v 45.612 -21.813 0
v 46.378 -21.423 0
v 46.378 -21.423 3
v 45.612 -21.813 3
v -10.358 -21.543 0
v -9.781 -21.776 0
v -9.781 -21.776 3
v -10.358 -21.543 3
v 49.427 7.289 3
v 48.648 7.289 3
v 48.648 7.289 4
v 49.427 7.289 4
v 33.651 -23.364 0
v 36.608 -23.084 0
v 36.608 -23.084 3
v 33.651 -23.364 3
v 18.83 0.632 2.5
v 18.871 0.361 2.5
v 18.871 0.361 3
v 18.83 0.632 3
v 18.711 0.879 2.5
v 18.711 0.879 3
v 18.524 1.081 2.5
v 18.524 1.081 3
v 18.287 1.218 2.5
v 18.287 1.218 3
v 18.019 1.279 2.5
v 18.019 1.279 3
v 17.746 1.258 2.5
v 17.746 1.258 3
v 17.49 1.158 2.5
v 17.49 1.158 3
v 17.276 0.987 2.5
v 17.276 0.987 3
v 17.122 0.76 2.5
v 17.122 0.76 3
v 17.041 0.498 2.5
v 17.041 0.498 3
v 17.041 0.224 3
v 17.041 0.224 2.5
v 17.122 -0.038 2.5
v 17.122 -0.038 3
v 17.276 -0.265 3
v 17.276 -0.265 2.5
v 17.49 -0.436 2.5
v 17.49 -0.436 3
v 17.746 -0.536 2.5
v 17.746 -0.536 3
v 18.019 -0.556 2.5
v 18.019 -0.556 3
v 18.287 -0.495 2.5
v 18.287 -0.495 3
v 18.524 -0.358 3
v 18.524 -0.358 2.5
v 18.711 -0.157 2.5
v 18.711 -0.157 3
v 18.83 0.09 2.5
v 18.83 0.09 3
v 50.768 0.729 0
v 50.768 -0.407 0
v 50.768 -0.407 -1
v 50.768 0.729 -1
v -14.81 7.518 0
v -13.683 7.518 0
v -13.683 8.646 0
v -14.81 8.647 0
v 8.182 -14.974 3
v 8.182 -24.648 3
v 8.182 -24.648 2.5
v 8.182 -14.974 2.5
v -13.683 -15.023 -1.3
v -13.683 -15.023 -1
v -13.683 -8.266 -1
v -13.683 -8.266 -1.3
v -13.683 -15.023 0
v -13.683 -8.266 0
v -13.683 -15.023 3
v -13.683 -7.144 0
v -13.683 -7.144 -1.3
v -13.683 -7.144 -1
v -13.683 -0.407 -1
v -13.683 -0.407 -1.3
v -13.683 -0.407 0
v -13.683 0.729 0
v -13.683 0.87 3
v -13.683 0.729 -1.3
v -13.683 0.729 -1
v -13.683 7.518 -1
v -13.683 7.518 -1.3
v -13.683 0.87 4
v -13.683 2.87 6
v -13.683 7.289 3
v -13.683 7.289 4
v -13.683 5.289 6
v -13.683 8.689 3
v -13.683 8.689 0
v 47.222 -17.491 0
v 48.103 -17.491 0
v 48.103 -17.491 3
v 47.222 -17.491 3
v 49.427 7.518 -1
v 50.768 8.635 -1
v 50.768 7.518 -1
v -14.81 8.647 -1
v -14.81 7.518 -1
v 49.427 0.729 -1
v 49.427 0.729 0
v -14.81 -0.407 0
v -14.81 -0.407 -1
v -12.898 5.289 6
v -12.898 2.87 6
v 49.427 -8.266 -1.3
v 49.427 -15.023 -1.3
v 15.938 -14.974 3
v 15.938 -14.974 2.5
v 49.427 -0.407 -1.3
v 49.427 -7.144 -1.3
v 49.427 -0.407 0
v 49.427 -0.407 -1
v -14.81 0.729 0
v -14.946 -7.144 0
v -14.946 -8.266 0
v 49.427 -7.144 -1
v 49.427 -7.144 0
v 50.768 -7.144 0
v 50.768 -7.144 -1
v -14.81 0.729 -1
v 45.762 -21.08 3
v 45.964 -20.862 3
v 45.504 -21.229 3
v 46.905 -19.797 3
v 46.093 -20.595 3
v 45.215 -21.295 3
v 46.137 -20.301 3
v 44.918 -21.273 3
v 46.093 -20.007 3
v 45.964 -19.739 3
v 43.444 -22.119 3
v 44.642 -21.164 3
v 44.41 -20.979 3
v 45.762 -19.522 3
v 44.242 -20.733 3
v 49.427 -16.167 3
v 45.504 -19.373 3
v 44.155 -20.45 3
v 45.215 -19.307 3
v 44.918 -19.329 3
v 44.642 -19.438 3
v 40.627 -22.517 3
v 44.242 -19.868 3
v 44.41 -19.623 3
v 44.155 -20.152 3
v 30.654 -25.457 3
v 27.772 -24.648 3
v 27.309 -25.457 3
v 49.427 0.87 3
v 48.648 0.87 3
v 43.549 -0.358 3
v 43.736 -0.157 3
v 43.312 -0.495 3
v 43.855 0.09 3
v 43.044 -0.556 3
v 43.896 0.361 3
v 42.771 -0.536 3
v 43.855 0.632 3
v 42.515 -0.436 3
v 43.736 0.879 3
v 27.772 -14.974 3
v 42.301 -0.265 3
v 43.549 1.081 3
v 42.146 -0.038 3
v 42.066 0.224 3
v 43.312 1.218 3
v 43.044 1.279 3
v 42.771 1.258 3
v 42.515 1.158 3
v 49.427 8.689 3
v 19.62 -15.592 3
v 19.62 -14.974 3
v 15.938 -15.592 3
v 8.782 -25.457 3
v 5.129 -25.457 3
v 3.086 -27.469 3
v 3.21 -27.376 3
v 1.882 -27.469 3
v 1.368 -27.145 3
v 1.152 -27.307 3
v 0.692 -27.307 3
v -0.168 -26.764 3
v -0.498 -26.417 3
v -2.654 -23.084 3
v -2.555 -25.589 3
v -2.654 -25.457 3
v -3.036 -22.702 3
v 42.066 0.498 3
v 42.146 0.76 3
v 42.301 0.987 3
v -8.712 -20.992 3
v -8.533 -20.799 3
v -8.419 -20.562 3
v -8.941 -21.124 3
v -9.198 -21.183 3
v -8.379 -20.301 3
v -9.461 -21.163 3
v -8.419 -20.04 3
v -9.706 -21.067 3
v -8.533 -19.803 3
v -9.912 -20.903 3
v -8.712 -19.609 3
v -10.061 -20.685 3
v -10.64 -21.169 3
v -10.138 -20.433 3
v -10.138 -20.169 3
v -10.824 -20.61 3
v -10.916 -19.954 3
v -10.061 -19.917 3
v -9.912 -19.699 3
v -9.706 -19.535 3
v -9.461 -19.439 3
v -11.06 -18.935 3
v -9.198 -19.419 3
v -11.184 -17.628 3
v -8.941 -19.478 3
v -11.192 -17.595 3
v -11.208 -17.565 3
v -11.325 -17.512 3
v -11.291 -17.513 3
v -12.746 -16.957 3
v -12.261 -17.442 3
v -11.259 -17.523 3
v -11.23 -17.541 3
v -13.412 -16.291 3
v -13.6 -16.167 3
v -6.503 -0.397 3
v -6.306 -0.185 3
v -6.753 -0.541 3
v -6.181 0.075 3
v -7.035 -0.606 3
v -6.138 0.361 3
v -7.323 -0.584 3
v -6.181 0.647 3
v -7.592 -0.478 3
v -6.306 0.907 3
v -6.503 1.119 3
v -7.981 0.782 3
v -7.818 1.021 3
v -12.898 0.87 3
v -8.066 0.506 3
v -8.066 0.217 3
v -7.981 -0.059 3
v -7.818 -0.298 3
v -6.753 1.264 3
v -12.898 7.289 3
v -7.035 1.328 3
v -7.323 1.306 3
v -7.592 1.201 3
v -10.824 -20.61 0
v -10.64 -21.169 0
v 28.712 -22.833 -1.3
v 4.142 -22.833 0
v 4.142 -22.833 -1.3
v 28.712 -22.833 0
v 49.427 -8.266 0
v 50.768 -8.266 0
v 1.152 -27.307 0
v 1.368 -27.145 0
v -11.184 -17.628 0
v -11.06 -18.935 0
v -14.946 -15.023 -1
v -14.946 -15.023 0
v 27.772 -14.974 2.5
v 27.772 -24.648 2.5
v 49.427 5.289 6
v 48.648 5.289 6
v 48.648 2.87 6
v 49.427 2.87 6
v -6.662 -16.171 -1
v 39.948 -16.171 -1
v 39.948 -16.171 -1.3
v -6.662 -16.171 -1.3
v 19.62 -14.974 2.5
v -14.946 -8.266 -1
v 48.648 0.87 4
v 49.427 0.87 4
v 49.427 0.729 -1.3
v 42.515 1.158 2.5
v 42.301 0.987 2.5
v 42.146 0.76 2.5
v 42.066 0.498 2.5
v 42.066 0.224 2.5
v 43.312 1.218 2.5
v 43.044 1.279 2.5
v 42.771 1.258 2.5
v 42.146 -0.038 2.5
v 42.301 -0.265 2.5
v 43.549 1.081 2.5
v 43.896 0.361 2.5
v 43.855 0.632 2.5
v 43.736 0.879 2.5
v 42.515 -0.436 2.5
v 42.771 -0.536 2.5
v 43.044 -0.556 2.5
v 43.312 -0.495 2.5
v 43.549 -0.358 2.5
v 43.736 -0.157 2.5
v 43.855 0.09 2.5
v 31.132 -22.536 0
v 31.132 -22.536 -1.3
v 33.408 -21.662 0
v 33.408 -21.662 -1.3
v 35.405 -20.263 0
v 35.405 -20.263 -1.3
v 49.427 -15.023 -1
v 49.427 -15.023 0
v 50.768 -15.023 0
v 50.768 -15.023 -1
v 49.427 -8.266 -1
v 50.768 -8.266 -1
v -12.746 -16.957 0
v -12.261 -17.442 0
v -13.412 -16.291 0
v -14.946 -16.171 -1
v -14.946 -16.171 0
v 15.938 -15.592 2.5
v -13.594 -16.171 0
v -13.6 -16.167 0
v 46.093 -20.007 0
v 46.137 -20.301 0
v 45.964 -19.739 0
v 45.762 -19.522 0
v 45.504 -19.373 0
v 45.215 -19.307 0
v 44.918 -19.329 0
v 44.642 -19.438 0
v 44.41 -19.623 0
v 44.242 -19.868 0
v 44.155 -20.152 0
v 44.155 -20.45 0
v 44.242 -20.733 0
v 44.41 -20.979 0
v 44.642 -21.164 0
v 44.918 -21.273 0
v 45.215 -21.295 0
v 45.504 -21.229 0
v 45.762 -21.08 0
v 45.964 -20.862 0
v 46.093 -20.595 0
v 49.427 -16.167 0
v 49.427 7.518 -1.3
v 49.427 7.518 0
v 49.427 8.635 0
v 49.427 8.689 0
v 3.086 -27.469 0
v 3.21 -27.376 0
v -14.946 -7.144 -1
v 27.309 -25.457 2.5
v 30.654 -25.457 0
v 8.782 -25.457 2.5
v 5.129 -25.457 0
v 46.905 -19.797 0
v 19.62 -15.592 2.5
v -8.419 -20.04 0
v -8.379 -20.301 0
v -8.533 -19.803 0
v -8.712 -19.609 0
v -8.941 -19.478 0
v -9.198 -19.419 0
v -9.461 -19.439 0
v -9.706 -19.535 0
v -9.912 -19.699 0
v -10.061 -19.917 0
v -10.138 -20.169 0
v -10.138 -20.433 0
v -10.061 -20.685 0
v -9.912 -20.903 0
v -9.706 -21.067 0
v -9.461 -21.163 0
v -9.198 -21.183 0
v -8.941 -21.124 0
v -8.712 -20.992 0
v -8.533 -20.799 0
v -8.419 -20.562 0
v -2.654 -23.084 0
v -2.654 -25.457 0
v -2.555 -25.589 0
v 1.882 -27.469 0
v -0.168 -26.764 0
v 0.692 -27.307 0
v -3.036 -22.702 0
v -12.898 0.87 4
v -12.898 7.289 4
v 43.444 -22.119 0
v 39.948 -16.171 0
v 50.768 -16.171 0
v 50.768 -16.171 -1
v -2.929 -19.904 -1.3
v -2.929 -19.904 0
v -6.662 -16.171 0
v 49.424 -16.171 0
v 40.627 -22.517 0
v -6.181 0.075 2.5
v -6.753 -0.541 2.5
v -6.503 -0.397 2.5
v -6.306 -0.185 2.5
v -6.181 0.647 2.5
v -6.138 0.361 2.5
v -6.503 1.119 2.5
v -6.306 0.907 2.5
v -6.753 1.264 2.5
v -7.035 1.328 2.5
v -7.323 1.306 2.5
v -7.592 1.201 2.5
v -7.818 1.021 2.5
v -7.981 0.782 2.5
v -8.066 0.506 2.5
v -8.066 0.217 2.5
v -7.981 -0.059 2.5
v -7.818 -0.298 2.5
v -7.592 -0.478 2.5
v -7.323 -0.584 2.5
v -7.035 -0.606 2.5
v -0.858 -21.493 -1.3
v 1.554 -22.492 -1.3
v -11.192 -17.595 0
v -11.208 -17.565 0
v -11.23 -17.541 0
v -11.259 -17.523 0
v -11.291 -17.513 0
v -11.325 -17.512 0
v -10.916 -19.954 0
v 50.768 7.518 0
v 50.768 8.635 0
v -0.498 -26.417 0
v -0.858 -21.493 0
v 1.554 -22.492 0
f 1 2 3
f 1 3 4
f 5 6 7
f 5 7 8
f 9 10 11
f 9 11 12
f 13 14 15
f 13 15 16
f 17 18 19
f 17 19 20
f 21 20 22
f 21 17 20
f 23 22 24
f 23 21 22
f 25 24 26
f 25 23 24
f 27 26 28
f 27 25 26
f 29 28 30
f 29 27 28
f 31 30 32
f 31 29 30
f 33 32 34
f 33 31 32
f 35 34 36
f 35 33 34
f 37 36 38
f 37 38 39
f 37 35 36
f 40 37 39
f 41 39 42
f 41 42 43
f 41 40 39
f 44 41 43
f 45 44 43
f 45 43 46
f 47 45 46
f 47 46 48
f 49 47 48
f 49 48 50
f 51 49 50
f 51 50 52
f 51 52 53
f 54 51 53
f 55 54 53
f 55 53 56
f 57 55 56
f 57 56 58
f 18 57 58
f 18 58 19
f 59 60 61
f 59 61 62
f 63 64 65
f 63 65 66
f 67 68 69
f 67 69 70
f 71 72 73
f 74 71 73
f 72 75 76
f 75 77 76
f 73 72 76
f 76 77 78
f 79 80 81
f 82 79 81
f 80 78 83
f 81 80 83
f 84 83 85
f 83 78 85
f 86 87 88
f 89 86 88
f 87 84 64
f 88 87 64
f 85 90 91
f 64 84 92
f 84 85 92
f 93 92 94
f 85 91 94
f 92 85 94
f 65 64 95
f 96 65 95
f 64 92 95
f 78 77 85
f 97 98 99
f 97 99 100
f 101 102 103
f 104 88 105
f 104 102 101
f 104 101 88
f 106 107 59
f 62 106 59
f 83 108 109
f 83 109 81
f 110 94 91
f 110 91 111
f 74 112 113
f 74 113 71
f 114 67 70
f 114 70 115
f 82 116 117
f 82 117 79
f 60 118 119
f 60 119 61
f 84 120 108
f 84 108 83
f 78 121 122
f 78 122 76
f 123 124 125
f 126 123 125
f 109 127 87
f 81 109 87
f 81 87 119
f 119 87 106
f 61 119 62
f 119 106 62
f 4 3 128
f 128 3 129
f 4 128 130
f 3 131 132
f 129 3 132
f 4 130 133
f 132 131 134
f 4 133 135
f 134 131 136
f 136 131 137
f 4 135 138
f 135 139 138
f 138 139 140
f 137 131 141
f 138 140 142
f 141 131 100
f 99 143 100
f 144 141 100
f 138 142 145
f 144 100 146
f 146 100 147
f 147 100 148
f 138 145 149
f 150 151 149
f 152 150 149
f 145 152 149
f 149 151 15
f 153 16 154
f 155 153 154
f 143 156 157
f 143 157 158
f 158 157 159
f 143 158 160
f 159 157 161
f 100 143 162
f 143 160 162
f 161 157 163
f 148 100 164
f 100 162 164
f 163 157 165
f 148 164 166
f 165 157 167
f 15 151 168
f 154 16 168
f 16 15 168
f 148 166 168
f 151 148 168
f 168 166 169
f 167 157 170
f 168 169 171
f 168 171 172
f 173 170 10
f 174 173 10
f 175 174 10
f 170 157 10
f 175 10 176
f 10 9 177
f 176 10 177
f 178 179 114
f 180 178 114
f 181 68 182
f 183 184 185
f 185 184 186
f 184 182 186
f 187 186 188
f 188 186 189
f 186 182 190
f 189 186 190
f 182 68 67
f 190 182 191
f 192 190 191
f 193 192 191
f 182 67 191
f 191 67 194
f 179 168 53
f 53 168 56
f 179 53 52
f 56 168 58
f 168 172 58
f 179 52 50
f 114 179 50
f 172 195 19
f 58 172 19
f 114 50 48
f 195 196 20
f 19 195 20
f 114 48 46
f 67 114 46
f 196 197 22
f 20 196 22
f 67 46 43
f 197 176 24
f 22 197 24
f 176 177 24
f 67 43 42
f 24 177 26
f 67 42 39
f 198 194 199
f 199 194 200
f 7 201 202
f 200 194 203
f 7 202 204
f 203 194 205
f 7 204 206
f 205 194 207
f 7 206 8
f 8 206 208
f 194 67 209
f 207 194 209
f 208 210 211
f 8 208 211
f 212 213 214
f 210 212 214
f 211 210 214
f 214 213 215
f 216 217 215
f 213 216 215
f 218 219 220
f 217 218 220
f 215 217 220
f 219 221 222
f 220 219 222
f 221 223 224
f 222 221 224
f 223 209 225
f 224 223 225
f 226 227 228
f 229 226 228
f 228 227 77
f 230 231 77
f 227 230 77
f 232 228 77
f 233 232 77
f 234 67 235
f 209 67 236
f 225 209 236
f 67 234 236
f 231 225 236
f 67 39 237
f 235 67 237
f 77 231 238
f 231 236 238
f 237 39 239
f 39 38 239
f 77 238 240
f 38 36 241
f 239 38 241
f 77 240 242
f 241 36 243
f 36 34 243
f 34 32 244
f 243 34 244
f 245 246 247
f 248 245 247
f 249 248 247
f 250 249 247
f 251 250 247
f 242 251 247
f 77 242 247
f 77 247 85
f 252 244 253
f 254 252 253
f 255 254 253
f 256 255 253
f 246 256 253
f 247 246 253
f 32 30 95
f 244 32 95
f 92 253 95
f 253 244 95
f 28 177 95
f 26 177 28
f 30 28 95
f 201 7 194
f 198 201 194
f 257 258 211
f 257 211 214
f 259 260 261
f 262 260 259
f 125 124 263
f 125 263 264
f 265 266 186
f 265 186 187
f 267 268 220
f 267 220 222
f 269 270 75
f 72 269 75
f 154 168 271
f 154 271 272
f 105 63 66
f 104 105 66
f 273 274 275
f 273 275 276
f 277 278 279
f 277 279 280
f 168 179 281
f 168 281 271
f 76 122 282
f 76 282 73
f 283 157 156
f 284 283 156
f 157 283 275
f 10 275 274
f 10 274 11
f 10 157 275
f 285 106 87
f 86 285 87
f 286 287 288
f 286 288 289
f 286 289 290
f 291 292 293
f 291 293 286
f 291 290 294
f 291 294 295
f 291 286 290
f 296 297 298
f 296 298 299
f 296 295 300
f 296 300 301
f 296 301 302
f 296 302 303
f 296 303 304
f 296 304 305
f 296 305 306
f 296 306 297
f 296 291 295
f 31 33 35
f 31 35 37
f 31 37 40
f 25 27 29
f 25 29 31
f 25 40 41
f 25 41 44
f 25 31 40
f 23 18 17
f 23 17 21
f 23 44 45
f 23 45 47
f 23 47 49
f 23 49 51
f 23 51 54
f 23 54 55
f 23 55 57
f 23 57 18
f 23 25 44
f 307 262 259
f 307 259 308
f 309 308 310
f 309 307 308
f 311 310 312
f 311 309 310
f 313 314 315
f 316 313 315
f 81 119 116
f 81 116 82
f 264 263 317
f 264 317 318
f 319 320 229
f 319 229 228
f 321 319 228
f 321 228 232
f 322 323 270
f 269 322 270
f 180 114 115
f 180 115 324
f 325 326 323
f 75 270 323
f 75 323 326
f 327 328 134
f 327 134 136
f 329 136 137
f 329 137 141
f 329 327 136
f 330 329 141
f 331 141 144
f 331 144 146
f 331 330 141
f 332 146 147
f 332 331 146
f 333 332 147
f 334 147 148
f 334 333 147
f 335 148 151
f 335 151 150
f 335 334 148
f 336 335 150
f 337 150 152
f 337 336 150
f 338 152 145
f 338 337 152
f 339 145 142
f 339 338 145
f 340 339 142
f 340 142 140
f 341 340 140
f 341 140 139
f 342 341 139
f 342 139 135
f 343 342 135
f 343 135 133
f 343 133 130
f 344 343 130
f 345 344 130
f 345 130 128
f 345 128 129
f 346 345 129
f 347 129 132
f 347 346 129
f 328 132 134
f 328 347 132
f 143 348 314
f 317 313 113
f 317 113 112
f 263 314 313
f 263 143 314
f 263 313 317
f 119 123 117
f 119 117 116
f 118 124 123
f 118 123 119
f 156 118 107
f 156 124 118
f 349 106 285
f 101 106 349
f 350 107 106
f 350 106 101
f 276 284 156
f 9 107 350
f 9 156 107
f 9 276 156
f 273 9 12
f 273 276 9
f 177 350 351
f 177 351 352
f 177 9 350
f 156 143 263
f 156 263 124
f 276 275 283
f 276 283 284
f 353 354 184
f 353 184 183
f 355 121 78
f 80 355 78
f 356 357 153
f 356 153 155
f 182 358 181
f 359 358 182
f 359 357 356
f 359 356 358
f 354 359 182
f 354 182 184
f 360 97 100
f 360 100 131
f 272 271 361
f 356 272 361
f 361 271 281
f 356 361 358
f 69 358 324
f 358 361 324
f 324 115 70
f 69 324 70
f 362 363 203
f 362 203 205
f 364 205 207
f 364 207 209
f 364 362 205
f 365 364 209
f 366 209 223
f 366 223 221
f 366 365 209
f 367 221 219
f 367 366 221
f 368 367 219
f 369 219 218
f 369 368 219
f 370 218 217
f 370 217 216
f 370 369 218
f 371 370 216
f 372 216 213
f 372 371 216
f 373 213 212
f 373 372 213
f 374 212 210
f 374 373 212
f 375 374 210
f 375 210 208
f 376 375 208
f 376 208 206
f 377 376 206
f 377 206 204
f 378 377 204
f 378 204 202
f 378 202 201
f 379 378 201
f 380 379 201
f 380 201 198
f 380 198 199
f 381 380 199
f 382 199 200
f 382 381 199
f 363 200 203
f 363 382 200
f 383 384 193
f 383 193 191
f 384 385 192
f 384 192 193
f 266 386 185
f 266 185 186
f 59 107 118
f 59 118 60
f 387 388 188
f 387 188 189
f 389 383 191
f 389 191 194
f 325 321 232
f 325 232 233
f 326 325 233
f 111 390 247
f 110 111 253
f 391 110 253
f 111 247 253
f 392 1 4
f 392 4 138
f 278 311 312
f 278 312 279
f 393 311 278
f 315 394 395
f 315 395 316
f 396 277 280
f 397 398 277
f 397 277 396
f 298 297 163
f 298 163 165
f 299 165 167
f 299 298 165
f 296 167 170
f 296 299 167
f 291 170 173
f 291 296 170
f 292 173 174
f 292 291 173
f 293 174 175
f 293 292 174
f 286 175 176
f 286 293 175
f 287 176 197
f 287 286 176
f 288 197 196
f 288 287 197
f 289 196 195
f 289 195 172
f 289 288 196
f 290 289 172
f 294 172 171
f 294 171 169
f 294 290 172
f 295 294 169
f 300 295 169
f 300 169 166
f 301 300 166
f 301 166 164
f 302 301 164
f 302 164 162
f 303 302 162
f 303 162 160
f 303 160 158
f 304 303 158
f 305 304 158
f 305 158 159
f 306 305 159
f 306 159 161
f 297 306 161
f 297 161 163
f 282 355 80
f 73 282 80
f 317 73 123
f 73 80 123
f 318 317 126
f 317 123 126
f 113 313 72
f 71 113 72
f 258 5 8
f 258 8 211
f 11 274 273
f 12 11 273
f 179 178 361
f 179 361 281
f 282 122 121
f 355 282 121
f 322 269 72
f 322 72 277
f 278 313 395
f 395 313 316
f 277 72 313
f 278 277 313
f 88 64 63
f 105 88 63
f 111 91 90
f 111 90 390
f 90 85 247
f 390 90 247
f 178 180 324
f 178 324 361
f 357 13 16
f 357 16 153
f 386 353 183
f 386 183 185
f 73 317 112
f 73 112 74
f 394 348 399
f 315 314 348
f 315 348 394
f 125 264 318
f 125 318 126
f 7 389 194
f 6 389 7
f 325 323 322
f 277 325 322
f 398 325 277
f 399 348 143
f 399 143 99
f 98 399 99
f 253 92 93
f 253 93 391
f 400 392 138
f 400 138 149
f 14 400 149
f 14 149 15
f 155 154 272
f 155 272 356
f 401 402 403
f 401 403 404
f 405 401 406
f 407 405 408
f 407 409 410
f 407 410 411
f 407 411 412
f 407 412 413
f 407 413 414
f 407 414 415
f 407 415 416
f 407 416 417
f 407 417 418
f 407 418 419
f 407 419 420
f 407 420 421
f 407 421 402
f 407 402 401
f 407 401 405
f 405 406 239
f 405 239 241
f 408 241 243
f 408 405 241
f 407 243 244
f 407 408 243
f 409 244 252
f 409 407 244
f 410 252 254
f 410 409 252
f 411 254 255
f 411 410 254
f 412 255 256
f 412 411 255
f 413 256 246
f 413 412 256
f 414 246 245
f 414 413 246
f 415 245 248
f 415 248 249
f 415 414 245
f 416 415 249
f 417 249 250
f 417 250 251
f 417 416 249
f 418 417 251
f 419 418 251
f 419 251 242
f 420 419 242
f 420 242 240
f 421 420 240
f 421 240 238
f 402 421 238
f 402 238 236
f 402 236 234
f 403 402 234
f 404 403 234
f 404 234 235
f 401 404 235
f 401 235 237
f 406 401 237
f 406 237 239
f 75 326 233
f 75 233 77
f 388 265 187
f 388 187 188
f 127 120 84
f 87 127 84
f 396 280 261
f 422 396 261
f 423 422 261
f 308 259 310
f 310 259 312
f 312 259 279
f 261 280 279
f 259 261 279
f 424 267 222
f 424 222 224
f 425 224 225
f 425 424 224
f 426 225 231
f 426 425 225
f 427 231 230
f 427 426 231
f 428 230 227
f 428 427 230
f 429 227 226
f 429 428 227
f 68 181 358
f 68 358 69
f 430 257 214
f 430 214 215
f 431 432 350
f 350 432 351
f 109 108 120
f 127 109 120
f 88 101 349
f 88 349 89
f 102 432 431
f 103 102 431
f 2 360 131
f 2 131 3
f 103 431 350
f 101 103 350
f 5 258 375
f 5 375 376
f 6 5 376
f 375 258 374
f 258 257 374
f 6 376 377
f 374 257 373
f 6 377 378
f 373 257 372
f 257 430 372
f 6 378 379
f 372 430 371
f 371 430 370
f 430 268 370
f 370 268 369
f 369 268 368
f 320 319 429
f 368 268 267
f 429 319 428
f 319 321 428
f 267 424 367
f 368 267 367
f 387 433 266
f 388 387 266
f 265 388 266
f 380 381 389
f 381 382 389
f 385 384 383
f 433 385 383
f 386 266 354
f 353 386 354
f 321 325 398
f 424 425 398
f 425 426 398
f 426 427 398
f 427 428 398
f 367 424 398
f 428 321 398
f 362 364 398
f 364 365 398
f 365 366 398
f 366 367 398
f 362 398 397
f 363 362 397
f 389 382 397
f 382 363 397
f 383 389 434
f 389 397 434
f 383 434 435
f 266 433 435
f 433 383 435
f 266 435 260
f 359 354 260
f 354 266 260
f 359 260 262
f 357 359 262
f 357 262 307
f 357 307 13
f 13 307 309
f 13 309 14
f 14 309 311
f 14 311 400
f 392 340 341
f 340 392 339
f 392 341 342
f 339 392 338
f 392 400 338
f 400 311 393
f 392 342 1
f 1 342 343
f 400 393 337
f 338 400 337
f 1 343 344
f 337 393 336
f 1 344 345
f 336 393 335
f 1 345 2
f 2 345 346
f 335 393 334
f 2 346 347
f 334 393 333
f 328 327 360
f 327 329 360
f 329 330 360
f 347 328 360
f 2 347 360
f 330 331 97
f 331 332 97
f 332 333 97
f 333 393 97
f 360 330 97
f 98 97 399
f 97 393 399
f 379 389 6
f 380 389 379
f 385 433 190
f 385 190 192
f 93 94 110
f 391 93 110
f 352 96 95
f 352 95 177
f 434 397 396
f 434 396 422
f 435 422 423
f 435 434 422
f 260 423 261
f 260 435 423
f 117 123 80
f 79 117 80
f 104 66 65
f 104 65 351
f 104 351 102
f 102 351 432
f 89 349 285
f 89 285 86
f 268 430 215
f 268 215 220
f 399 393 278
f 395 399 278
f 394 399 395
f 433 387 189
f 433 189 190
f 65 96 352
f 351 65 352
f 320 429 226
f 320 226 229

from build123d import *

# Parameters (mm, degrees)
CONTOURS_R              = 0.996805003
CONTOURS_R_2            = 0.884493699
CONTOURS_R_3            = 0.969462683
CONTOURS_R_4            = 0.92016771
BOSS_EXTRU_1_DEPTH      = 3
ENL_V_MAT_EXTRU_3_DEPTH = 0.5
ESQUISSE6_R             = 0.92016771
ESQUISSE6_R_2           = 0.969462683
BOSS_EXTRU_2_DEPTH      = 2.5
ESQUISSE7_W             = 65.577757284
ESQUISSE7_H             = 1.135573616
ESQUISSE7_W_2           = 65.714172828
ESQUISSE7_H_2           = 1.121624069
ESQUISSE7_H_3           = 1.147393865
BOSS_EXTRU_3_DEPTH      = 1
ESQUISSE8_W             = 63.110312129
ESQUISSE8_H             = 6.788838012
ESQUISSE8_H_2           = 6.737736788
ESQUISSE8_H_3           = 6.757335266
BOSS_EXTRU_4_DEPTH      = 1.3
ESQUISSE12_W            = 0.779629517
ESQUISSE12_H            = 6.41876269
ESQUISSE12_W_2          = 0.785524209
BOSS_EXTRU_6_DEPTH      = 3
CHANFREIN1_SIZE         = 2
CHANFREIN2_SIZE         = 2


with BuildPart() as part:
    # Contours → Boss.-Extru.1 (new body)
    with BuildSketch(Plane.XY):
        with BuildLine():
            Line((-13.53709508, 8.689037277), (49.427183341, 8.689037277))
            Line((49.427183341, 8.689037277), (49.427183341, -15.576035195))
            Line((49.427183341, -15.576035195), (49.427183341, -16.167014971))
            Line((49.427183341, -16.167014971), (48.103014513, -17.491183799))
            Line((48.103014513, -17.491183799), (47.222080517, -17.491183799))
            Line((47.222080517, -17.491183799), (46.905484209, -19.797319309))
            Line((46.905484209, -19.797319309), (46.377823694, -21.422513692))
            Line((46.377823694, -21.422513692), (45.61180941, -21.813030779))
            Line((45.61180941, -21.813030779), (43.444031236, -22.119025571))
            Line((43.444031236, -22.119025571), (40.627206664, -22.516637126))
            Line((40.627206664, -22.516637126), (36.607696599, -23.084014896))
            Line((36.607696599, -23.084014896), (33.650652093, -23.364304384))
            Line((33.650652093, -23.364304384), (30.65446793, -25.457235805))
            Line((30.65446793, -25.457235805), (5.129220902, -25.457235805))
            Line((5.129220902, -25.457235805), (3.210082619, -27.376374088))
            Line((3.210082619, -27.376374088), (3.086468117, -27.469210212))
            Line((3.086468117, -27.469210212), (1.882461508, -27.469210212))
            Line((1.882461508, -27.469210212), (1.368391271, -27.144534273))
            Line((1.368391271, -27.144534273), (1.152232663, -27.306872243))
            Line((1.152232663, -27.306872243), (0.691983064, -27.306872243))
            Line((0.691983064, -27.306872243), (-0.167684887, -26.763924063))
            Line((-0.167684887, -26.763924063), (-0.49849538, -26.416804947))
            Line((-0.49849538, -26.416804947), (-2.55477633, -25.588795397))
            Line((-2.55477633, -25.588795397), (-2.653579321, -25.457235805))
            Line((-2.653579321, -25.457235805), (-2.653579321, -23.084014896))
            Line((-2.653579321, -23.084014896), (-3.036044011, -22.701550207))
            Line((-3.036044011, -22.701550207), (-9.780970444, -21.775577383))
            Line((-9.780970444, -21.775577383), (-10.358479282, -21.543029961))
            Line((-10.358479282, -21.543029961), (-10.639580473, -21.168734027))
            Line((-10.639580473, -21.168734027), (-10.823901747, -20.609916501))
            Line((-10.823901747, -20.609916501), (-10.916488176, -19.954000633))
            Line((-10.916488176, -19.954000633), (-11.060291782, -18.935243689))
            Line((-11.060291782, -18.935243689), (-11.184195314, -17.628065669))
            ThreePointArc((-11.184195314, -17.628065669), (-11.230466887, -17.54072814), (-11.324942788, -17.511690124))
            Line((-11.324942788, -17.511690124), (-12.261208369, -17.442093435))
            Line((-12.261208369, -17.442093435), (-12.746327303, -16.956974502))
            Line((-12.746327303, -16.956974502), (-13.411955607, -16.291346198))
            Line((-13.411955607, -16.291346198), (-13.59975919, -16.167014971))
            Line((-13.59975919, -16.167014971), (-13.683128788, -15.023442521))
            Line((-13.683128788, -15.023442521), (-13.683128788, 8.689037277))
            Line((-13.683128788, 8.689037277), (-13.53709508, 8.689037277))
        make_face()
        with Locations((45.140288013, -20.300965513)):
            Circle(CONTOURS_R, mode=Mode.SUBTRACT)
        with Locations((-9.263810849, -20.300965513)):
            Circle(CONTOURS_R_2, mode=Mode.SUBTRACT)
        with Locations((-7.107072771, 0.361135268)):
            Circle(CONTOURS_R_3, mode=Mode.SUBTRACT)
        with Locations((17.950565341, 0.361135268)):
            Circle(CONTOURS_R_4, mode=Mode.SUBTRACT)
        with Locations((42.975492251, 0.361135268)):
            Circle(CONTOURS_R_4, mode=Mode.SUBTRACT)
    extrude(amount=BOSS_EXTRU_1_DEPTH)

    # Esquisse5 → Enlèv. mat.-Extru.3 (cut)
    with BuildSketch(Plane.XY.offset(3)):
        Polygon((8.181753212, -14.974213956), (15.937864767, -14.974213956), (15.937864767, -15.592047706), (19.619809184, -15.592047706), (19.619809184, -14.974213956), (27.772380941, -14.974213956), (27.772380941, -24.647748669), (27.308611889, -25.457235805), (8.782258705, -25.457235805), (8.181753212, -24.647748669), align=None)
    extrude(amount=-ENL_V_MAT_EXTRU_3_DEPTH, mode=Mode.SUBTRACT)

    # Esquisse6 → Boss.-Extru.2 (add)
    with BuildSketch(Plane.XY):
        with Locations((42.975492251, 0.361135268)):
            Circle(ESQUISSE6_R)
        with Locations((17.950565341, 0.361135268)):
            Circle(ESQUISSE6_R)
        with Locations((-7.107072771, 0.361135268)):
            Circle(ESQUISSE6_R_2)
    extrude(amount=BOSS_EXTRU_2_DEPTH)

    # Esquisse7 → Boss.-Extru.3 (add)
    with BuildSketch(Plane.XY):
        Polygon((-14.80971951, 8.646615937), (50.768037774, 8.635168208), (50.768037774, 7.517857947), (-14.80971951, 7.517857947), align=None)
        with Locations((17.979159132, 0.161233127)):
            Rectangle(ESQUISSE7_W, ESQUISSE7_H)
        with Locations((17.91095136, -7.705102504)):
            Rectangle(ESQUISSE7_W_2, ESQUISSE7_H_2)
        with Locations((17.91095136, -15.596946737)):
            Rectangle(ESQUISSE7_W_2, ESQUISSE7_H_3)
    extrude(amount=-BOSS_EXTRU_3_DEPTH)

    # Esquisse8 → Boss.-Extru.4 (add)
    with BuildSketch(Plane(origin=(0, 0, 0), x_dir=(-1, 0, 0), z_dir=(0, 0, -1))):
        with Locations((-17.872027276, 4.123438941)):
            Rectangle(ESQUISSE8_W, ESQUISSE8_H)
        with Locations((-17.872027276, -3.775422075)):
            Rectangle(ESQUISSE8_W, ESQUISSE8_H_2)
        with Locations((-17.872027276, -11.644582171)):
            Rectangle(ESQUISSE8_W, ESQUISSE8_H_3)
        with BuildLine():
            Line((-39.947601393, -16.170643669), (3.467572619, -16.170643669))
            Line((3.467572619, -16.170643669), (6.662365967, -16.170643669))
            Line((6.662365967, -16.170643669), (2.928932188, -19.904077448))
            ThreePointArc((2.928932188, -19.904077448), (-0.3153013, -22.071804962), (-4.142135624, -22.833009637))
            Line((-4.142135624, -22.833009637), (-28.712150945, -22.833009637))
            ThreePointArc((-28.712150945, -22.833009637), (-32.297105816, -22.168324231), (-35.405487251, -20.262629351))
            Line((-35.405487251, -20.262629351), (-39.947601393, -16.170643669))
        make_face()
    extrude(amount=BOSS_EXTRU_4_DEPTH)

    # Esquisse12 → Boss.-Extru.6 (add)
    with BuildSketch(Plane.XY.offset(3)):
        with Locations((49.037368583, 4.079655932)):
            Rectangle(ESQUISSE12_W, ESQUISSE12_H)
        with Locations((-13.290366684, 4.079655932)):
            Rectangle(ESQUISSE12_W_2, ESQUISSE12_H)
    extrude(amount=BOSS_EXTRU_6_DEPTH)

    # Chanfrein1
    chanfrein1_edges = [part.edges().sort_by_distance(p)[0] for p in [
        (49.037368582, 7.289037277, 6),
        (49.037368582, 0.870274587, 6),
    ]]
    chamfer(chanfrein1_edges, length=CHANFREIN1_SIZE)

    # Chanfrein2
    chanfrein2_edges = [part.edges().sort_by_distance(p)[0] for p in [
        (-13.290366684, 7.289037277, 6),
        (-13.290366684, 0.870274587, 6),
    ]]
    chamfer(chanfrein2_edges, length=CHANFREIN2_SIZE)


solid = part.part
